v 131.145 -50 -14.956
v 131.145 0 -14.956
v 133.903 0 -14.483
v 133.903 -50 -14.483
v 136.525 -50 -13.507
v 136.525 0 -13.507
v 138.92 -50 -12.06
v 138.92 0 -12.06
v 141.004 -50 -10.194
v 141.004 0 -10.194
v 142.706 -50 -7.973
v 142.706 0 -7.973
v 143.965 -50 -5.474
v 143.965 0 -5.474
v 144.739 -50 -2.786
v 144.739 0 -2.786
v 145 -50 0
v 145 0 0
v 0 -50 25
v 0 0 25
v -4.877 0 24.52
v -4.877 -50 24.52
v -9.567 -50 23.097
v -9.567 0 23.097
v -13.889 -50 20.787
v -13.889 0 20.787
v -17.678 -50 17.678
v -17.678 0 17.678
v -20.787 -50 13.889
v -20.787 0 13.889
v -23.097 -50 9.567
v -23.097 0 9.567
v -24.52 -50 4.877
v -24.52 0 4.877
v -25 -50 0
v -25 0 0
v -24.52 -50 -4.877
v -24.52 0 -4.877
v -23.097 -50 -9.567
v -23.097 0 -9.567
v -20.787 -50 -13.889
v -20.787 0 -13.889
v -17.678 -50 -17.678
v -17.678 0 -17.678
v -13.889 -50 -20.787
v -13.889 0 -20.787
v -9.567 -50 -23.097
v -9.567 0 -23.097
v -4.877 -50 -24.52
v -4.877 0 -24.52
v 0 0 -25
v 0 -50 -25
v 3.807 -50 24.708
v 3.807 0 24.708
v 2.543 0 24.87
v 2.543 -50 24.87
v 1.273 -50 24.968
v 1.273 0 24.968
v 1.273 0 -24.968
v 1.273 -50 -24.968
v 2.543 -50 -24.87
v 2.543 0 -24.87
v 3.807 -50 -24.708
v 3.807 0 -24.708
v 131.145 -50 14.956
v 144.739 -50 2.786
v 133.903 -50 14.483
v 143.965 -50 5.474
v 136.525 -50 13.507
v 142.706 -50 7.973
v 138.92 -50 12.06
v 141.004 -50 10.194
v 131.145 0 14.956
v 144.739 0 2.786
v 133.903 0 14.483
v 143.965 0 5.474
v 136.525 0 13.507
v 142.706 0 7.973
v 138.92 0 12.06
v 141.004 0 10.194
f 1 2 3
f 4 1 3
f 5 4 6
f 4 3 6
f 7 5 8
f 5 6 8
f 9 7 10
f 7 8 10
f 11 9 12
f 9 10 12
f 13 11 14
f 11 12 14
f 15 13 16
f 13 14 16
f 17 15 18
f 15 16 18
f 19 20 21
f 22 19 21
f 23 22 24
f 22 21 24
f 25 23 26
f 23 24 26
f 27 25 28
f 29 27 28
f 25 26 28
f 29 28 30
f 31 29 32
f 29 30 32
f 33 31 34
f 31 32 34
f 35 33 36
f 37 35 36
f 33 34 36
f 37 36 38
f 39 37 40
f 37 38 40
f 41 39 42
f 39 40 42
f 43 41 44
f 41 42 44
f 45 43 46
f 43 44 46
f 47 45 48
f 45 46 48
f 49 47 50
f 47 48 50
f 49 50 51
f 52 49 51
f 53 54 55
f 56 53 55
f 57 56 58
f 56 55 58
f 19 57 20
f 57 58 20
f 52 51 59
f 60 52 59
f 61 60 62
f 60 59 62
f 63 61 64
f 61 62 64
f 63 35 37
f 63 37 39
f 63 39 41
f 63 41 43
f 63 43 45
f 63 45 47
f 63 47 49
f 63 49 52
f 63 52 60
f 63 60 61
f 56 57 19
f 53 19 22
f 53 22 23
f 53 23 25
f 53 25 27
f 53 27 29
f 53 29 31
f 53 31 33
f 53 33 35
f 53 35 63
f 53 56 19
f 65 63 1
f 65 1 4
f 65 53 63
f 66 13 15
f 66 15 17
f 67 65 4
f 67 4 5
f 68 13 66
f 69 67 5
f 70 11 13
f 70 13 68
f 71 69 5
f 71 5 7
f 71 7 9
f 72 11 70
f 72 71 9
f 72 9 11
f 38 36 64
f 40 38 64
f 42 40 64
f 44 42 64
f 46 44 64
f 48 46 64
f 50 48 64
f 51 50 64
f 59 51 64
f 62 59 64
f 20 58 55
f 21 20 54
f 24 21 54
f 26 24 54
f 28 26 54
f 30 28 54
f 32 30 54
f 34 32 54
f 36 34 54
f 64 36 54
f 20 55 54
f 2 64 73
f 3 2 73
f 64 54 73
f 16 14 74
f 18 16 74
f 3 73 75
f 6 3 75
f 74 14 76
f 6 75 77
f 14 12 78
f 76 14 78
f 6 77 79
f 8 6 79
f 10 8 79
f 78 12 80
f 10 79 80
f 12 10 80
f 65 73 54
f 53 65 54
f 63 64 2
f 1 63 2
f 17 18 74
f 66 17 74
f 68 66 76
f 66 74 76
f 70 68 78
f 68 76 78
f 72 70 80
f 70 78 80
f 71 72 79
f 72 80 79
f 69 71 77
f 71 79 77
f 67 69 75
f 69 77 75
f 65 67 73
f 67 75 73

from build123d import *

# Parameters (mm, degrees)
F1_DEPTH = 50


with BuildPart() as f1:
    # F0 (on Front) → F1 (new body)
    with BuildSketch(Plane.XZ):
        with BuildLine():
            Line((3.806931, 24.708445), (0, 25))
            ThreePointArc((0, 25), (-25, 0), (0, -25))
            Line((0, -25), (3.806931, -24.708445))
            ThreePointArc((3.806931, -24.708445), (18.975949, -16.276159), (25, 0))
            ThreePointArc((25, 0), (18.975949, 16.276159), (3.806931, 24.708445))
        make_face()
        with BuildLine():
            ThreePointArc((3.806931, 24.708445), (1.909039, 24.927005), (0, 25))
            Line((0, 25), (3.806931, 24.708445))
        make_face()
        with BuildLine():
            Line((3.806931, -24.708445), (0, -25))
            ThreePointArc((0, -25), (1.909039, -24.927005), (3.806931, -24.708445))
        make_face()
        with BuildLine():
            Line((131.145424, 14.956203), (3.806931, 24.708445))
            ThreePointArc((3.806931, 24.708445), (18.975949, 16.276159), (25, 0))
            ThreePointArc((25, 0), (18.975949, -16.276159), (3.806931, -24.708445))
            Line((3.806931, -24.708445), (131.145424, -14.956203))
            ThreePointArc((131.145424, -14.956203), (115, 0), (131.145424, 14.956203))
        make_face()
        with BuildLine():
            ThreePointArc((145, 0), (141.004121, 10.193592), (131.145424, 14.956203))
            ThreePointArc((131.145424, 14.956203), (115, 0), (131.145424, -14.956203))
            ThreePointArc((131.145424, -14.956203), (141.004121, -10.193592), (145, 0))
        make_face()
    extrude(amount=F1_DEPTH)


solid = f1.part
